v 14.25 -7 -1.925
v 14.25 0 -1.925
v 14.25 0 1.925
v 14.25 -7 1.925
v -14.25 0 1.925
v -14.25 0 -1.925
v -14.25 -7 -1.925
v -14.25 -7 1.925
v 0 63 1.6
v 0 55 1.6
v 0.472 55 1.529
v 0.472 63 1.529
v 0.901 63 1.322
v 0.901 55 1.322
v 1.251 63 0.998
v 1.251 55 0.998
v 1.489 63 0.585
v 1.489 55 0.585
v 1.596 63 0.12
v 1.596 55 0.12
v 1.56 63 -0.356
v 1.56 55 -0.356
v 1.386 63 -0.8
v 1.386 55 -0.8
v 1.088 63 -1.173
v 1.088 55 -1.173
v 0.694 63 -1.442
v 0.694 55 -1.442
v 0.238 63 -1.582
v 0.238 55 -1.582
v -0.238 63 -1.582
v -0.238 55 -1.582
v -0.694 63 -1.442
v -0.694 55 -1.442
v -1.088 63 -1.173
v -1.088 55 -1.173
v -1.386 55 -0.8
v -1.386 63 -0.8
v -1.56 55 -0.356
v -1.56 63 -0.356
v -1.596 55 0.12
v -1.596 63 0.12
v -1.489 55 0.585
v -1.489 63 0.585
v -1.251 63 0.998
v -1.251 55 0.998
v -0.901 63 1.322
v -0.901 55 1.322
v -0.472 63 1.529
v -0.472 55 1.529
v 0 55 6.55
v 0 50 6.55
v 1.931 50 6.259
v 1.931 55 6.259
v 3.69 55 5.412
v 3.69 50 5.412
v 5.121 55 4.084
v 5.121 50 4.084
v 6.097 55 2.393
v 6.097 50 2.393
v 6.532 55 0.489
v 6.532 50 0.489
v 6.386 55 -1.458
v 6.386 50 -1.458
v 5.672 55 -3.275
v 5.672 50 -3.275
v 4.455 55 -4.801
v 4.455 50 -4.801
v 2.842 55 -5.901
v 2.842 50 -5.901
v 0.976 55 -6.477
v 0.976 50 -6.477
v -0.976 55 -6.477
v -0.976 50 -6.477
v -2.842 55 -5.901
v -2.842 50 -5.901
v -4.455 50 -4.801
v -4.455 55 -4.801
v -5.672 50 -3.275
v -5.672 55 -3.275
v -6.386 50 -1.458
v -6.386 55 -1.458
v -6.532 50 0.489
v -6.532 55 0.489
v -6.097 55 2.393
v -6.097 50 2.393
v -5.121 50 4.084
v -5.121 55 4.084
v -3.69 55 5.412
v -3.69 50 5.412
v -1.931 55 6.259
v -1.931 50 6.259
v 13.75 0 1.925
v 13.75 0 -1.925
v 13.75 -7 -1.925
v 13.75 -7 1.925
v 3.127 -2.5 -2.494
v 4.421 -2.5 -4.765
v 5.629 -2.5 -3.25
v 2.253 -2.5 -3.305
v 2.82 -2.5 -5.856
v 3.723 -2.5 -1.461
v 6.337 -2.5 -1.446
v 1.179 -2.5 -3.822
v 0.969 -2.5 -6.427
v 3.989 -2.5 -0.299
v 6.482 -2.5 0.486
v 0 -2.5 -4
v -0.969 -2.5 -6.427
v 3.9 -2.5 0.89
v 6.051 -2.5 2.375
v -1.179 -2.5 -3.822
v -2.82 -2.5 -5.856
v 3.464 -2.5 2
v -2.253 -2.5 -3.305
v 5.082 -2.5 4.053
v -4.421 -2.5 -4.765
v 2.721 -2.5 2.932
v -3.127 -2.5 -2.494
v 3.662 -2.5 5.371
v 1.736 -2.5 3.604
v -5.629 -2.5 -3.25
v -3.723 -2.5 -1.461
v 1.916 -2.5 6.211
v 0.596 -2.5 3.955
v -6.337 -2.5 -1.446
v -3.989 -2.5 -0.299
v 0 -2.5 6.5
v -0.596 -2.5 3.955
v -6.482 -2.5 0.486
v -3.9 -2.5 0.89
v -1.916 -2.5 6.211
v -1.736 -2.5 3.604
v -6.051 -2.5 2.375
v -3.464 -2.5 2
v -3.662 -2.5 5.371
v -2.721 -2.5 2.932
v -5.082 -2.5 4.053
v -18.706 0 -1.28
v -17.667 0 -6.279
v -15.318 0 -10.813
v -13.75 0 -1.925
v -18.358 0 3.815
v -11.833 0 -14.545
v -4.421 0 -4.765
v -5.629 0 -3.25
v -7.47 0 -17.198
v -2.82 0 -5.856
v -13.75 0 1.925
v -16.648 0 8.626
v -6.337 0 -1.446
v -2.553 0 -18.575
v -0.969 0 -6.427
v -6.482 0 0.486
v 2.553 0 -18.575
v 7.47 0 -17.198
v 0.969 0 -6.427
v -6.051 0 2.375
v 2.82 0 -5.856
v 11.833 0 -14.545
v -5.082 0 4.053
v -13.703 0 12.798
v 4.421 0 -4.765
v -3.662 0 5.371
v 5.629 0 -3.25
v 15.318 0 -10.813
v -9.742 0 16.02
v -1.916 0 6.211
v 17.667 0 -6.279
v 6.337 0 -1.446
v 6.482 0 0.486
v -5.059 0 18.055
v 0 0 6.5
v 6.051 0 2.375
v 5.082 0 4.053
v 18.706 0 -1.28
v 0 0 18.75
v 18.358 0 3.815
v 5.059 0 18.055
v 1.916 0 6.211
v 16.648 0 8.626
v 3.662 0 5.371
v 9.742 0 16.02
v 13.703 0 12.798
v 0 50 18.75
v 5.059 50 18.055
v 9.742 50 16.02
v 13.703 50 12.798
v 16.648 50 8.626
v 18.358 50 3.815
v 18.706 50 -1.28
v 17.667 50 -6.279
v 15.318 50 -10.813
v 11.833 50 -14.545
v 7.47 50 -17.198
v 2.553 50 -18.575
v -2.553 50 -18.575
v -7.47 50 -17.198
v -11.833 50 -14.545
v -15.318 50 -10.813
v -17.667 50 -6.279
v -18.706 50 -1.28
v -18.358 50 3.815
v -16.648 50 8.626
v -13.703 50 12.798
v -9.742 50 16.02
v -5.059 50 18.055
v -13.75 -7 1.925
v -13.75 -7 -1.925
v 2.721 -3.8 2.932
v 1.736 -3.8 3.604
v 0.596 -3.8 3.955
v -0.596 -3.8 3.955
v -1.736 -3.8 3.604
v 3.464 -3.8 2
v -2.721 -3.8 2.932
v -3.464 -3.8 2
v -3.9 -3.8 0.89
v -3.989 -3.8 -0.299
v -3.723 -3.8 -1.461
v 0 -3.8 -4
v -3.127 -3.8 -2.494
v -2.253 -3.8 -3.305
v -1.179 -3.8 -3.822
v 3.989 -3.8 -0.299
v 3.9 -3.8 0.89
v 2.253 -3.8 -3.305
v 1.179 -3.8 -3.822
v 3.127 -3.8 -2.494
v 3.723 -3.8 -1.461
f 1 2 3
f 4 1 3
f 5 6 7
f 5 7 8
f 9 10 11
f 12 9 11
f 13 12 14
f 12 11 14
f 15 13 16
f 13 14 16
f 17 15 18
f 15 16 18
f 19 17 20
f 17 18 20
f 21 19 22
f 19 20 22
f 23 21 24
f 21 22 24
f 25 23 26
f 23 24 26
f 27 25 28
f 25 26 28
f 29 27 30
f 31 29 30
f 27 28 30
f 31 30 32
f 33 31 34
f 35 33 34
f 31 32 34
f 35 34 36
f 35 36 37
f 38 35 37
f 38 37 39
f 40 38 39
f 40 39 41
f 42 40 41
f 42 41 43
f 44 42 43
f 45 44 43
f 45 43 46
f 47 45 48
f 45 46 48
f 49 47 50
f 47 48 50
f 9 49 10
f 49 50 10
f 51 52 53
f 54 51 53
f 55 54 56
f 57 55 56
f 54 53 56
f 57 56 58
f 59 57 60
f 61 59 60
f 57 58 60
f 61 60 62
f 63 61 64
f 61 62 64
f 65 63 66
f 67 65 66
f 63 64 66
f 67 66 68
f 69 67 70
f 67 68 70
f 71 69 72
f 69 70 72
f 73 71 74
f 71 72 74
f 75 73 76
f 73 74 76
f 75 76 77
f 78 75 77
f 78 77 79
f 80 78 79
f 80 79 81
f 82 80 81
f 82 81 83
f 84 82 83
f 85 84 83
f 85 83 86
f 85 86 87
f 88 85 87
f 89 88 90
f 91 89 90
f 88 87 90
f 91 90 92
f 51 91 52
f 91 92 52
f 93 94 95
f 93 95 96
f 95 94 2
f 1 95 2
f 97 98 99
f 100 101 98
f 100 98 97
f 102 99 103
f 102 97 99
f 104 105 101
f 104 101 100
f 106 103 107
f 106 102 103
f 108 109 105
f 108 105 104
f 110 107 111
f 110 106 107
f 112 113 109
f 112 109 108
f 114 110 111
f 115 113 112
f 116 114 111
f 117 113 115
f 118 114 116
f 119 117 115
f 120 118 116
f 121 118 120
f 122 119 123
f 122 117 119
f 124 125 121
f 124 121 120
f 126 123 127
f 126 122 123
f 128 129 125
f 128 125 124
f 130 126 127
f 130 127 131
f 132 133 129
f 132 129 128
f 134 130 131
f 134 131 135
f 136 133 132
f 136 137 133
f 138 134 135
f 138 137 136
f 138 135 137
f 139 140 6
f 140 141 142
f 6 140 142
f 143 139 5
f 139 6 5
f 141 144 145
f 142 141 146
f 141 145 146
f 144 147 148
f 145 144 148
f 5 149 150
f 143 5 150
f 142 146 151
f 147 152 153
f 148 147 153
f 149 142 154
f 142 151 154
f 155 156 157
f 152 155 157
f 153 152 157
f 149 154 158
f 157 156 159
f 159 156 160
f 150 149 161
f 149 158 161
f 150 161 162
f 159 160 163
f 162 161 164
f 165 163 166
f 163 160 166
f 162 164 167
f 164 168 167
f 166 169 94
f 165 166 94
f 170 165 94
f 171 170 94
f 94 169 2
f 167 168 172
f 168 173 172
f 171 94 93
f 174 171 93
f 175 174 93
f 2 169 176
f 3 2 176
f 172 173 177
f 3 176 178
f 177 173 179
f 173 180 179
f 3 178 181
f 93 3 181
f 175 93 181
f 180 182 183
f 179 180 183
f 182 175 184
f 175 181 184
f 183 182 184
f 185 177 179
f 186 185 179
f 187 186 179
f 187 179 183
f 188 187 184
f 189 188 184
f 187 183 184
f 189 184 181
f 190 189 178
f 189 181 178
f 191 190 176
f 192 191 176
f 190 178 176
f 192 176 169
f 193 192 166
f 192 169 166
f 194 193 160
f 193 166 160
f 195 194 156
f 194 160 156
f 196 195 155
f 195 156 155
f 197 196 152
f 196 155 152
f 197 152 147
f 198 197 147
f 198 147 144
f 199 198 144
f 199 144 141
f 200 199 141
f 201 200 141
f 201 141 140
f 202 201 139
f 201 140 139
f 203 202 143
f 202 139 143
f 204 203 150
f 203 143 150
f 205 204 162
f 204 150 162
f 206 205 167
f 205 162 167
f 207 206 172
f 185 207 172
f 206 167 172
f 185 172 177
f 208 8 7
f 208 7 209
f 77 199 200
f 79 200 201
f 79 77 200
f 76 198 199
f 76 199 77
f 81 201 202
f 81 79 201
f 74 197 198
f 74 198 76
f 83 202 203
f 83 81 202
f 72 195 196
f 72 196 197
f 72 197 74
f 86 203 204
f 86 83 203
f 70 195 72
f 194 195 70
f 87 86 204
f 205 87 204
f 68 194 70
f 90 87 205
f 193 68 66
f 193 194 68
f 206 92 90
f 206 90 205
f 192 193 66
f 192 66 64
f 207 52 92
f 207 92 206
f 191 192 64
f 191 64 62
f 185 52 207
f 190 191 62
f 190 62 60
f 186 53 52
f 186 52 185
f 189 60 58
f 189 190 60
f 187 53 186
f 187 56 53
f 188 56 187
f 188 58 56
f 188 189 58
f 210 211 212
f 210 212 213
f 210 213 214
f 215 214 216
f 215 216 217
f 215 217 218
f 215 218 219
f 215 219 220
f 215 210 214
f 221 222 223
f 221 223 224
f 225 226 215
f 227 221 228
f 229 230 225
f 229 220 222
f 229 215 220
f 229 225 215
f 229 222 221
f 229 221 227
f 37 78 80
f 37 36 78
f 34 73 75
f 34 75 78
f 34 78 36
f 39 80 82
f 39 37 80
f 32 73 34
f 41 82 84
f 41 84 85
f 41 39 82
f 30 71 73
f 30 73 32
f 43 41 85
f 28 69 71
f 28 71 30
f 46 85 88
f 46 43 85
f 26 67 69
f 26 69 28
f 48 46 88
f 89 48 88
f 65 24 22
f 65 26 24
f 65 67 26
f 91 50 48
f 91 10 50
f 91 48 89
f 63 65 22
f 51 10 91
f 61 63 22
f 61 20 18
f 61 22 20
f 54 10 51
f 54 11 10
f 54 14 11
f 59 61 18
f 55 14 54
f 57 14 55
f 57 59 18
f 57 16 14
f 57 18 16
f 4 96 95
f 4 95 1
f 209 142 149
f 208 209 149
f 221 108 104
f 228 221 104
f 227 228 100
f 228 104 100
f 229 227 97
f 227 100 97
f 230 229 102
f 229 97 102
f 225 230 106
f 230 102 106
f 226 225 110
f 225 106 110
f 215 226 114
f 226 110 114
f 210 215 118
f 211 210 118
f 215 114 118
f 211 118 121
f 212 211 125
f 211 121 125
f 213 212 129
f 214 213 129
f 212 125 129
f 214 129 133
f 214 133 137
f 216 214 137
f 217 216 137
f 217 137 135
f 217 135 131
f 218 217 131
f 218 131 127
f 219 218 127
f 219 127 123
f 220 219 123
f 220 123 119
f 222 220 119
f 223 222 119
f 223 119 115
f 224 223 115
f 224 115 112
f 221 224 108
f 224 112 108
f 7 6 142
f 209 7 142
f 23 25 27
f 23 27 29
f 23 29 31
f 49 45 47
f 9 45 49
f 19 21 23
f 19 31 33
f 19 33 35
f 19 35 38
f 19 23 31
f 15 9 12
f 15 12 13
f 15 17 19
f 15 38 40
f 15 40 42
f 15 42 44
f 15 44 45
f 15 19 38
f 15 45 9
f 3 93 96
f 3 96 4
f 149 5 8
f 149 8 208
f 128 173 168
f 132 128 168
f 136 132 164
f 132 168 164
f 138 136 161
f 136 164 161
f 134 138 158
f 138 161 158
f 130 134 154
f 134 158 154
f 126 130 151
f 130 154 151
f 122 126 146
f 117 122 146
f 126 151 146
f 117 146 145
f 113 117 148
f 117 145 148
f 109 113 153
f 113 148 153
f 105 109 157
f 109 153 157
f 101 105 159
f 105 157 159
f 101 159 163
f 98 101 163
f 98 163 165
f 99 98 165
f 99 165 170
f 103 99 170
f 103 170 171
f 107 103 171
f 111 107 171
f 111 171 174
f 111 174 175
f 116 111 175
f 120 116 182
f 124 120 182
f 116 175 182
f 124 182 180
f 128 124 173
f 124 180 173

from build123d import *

# Parameters (mm, degrees)
SKETCH1_R           = 18.75
BOSS_EXTRUDE1_DEPTH = 50
SKETCH2_R           = 6.55
BOSS_EXTRUDE2_DEPTH = 5
SKETCH3_R           = 1.6
BOSS_EXTRUDE3_DEPTH = 8
SKETCH4_R           = 6.5
BOSS_EXTRUDE4_DEPTH = 2.5
SKETCH5_R           = 4
BOSS_EXTRUDE5_DEPTH = 1.3
SKETCH6_W           = 0.5
SKETCH6_H           = 3.85
BOSS_EXTRUDE6_DEPTH = 7


with BuildPart() as part:
    # Sketch1 → Boss-Extrude1 (new body)
    with BuildSketch(Plane(origin=(0, 0, 0), x_dir=(1, 0, 0), z_dir=(0, 1, 0))):
        with Locations(Location((0, 0, 0), (0, 0, 270))):
            Circle(SKETCH1_R)
    extrude(amount=BOSS_EXTRUDE1_DEPTH)

    # Sketch2 → Boss-Extrude2 (add)
    with BuildSketch(Plane(origin=(0, 50, 0), x_dir=(1, 0, 0), z_dir=(0, 1, 0))):
        with Locations(Location((0, 0, 0), (0, 0, 270))):
            Circle(SKETCH2_R)
    extrude(amount=BOSS_EXTRUDE2_DEPTH)

    # Sketch3 → Boss-Extrude3 (add)
    with BuildSketch(Plane(origin=(0, 55, 0), x_dir=(1, 0, 0), z_dir=(0, 1, 0))):
        with Locations(Location((0, 0, 0), (0, 0, 270))):
            Circle(SKETCH3_R)
    extrude(amount=BOSS_EXTRUDE3_DEPTH)

    # Sketch4 → Boss-Extrude4 (add)
    with BuildSketch(Plane.XZ):
        with Locations(Location((0, 0, 0), (0, 0, 90))):
            Circle(SKETCH4_R)
    extrude(amount=BOSS_EXTRUDE4_DEPTH)

    # Sketch5 → Boss-Extrude5 (add)
    with BuildSketch(Plane.XZ.offset(2.5)):
        with Locations(Location((0, 0, 0), (0, 0, 270))):
            Circle(SKETCH5_R)
    extrude(amount=BOSS_EXTRUDE5_DEPTH)

    # Sketch6 → Boss-Extrude6 (add)
    with BuildSketch(Plane.XZ):
        with Locations((-14, 0)):
            Rectangle(SKETCH6_W, SKETCH6_H)
        with Locations((14, 0)):
            Rectangle(SKETCH6_W, SKETCH6_H)
    extrude(amount=BOSS_EXTRUDE6_DEPTH)


solid = part.part
